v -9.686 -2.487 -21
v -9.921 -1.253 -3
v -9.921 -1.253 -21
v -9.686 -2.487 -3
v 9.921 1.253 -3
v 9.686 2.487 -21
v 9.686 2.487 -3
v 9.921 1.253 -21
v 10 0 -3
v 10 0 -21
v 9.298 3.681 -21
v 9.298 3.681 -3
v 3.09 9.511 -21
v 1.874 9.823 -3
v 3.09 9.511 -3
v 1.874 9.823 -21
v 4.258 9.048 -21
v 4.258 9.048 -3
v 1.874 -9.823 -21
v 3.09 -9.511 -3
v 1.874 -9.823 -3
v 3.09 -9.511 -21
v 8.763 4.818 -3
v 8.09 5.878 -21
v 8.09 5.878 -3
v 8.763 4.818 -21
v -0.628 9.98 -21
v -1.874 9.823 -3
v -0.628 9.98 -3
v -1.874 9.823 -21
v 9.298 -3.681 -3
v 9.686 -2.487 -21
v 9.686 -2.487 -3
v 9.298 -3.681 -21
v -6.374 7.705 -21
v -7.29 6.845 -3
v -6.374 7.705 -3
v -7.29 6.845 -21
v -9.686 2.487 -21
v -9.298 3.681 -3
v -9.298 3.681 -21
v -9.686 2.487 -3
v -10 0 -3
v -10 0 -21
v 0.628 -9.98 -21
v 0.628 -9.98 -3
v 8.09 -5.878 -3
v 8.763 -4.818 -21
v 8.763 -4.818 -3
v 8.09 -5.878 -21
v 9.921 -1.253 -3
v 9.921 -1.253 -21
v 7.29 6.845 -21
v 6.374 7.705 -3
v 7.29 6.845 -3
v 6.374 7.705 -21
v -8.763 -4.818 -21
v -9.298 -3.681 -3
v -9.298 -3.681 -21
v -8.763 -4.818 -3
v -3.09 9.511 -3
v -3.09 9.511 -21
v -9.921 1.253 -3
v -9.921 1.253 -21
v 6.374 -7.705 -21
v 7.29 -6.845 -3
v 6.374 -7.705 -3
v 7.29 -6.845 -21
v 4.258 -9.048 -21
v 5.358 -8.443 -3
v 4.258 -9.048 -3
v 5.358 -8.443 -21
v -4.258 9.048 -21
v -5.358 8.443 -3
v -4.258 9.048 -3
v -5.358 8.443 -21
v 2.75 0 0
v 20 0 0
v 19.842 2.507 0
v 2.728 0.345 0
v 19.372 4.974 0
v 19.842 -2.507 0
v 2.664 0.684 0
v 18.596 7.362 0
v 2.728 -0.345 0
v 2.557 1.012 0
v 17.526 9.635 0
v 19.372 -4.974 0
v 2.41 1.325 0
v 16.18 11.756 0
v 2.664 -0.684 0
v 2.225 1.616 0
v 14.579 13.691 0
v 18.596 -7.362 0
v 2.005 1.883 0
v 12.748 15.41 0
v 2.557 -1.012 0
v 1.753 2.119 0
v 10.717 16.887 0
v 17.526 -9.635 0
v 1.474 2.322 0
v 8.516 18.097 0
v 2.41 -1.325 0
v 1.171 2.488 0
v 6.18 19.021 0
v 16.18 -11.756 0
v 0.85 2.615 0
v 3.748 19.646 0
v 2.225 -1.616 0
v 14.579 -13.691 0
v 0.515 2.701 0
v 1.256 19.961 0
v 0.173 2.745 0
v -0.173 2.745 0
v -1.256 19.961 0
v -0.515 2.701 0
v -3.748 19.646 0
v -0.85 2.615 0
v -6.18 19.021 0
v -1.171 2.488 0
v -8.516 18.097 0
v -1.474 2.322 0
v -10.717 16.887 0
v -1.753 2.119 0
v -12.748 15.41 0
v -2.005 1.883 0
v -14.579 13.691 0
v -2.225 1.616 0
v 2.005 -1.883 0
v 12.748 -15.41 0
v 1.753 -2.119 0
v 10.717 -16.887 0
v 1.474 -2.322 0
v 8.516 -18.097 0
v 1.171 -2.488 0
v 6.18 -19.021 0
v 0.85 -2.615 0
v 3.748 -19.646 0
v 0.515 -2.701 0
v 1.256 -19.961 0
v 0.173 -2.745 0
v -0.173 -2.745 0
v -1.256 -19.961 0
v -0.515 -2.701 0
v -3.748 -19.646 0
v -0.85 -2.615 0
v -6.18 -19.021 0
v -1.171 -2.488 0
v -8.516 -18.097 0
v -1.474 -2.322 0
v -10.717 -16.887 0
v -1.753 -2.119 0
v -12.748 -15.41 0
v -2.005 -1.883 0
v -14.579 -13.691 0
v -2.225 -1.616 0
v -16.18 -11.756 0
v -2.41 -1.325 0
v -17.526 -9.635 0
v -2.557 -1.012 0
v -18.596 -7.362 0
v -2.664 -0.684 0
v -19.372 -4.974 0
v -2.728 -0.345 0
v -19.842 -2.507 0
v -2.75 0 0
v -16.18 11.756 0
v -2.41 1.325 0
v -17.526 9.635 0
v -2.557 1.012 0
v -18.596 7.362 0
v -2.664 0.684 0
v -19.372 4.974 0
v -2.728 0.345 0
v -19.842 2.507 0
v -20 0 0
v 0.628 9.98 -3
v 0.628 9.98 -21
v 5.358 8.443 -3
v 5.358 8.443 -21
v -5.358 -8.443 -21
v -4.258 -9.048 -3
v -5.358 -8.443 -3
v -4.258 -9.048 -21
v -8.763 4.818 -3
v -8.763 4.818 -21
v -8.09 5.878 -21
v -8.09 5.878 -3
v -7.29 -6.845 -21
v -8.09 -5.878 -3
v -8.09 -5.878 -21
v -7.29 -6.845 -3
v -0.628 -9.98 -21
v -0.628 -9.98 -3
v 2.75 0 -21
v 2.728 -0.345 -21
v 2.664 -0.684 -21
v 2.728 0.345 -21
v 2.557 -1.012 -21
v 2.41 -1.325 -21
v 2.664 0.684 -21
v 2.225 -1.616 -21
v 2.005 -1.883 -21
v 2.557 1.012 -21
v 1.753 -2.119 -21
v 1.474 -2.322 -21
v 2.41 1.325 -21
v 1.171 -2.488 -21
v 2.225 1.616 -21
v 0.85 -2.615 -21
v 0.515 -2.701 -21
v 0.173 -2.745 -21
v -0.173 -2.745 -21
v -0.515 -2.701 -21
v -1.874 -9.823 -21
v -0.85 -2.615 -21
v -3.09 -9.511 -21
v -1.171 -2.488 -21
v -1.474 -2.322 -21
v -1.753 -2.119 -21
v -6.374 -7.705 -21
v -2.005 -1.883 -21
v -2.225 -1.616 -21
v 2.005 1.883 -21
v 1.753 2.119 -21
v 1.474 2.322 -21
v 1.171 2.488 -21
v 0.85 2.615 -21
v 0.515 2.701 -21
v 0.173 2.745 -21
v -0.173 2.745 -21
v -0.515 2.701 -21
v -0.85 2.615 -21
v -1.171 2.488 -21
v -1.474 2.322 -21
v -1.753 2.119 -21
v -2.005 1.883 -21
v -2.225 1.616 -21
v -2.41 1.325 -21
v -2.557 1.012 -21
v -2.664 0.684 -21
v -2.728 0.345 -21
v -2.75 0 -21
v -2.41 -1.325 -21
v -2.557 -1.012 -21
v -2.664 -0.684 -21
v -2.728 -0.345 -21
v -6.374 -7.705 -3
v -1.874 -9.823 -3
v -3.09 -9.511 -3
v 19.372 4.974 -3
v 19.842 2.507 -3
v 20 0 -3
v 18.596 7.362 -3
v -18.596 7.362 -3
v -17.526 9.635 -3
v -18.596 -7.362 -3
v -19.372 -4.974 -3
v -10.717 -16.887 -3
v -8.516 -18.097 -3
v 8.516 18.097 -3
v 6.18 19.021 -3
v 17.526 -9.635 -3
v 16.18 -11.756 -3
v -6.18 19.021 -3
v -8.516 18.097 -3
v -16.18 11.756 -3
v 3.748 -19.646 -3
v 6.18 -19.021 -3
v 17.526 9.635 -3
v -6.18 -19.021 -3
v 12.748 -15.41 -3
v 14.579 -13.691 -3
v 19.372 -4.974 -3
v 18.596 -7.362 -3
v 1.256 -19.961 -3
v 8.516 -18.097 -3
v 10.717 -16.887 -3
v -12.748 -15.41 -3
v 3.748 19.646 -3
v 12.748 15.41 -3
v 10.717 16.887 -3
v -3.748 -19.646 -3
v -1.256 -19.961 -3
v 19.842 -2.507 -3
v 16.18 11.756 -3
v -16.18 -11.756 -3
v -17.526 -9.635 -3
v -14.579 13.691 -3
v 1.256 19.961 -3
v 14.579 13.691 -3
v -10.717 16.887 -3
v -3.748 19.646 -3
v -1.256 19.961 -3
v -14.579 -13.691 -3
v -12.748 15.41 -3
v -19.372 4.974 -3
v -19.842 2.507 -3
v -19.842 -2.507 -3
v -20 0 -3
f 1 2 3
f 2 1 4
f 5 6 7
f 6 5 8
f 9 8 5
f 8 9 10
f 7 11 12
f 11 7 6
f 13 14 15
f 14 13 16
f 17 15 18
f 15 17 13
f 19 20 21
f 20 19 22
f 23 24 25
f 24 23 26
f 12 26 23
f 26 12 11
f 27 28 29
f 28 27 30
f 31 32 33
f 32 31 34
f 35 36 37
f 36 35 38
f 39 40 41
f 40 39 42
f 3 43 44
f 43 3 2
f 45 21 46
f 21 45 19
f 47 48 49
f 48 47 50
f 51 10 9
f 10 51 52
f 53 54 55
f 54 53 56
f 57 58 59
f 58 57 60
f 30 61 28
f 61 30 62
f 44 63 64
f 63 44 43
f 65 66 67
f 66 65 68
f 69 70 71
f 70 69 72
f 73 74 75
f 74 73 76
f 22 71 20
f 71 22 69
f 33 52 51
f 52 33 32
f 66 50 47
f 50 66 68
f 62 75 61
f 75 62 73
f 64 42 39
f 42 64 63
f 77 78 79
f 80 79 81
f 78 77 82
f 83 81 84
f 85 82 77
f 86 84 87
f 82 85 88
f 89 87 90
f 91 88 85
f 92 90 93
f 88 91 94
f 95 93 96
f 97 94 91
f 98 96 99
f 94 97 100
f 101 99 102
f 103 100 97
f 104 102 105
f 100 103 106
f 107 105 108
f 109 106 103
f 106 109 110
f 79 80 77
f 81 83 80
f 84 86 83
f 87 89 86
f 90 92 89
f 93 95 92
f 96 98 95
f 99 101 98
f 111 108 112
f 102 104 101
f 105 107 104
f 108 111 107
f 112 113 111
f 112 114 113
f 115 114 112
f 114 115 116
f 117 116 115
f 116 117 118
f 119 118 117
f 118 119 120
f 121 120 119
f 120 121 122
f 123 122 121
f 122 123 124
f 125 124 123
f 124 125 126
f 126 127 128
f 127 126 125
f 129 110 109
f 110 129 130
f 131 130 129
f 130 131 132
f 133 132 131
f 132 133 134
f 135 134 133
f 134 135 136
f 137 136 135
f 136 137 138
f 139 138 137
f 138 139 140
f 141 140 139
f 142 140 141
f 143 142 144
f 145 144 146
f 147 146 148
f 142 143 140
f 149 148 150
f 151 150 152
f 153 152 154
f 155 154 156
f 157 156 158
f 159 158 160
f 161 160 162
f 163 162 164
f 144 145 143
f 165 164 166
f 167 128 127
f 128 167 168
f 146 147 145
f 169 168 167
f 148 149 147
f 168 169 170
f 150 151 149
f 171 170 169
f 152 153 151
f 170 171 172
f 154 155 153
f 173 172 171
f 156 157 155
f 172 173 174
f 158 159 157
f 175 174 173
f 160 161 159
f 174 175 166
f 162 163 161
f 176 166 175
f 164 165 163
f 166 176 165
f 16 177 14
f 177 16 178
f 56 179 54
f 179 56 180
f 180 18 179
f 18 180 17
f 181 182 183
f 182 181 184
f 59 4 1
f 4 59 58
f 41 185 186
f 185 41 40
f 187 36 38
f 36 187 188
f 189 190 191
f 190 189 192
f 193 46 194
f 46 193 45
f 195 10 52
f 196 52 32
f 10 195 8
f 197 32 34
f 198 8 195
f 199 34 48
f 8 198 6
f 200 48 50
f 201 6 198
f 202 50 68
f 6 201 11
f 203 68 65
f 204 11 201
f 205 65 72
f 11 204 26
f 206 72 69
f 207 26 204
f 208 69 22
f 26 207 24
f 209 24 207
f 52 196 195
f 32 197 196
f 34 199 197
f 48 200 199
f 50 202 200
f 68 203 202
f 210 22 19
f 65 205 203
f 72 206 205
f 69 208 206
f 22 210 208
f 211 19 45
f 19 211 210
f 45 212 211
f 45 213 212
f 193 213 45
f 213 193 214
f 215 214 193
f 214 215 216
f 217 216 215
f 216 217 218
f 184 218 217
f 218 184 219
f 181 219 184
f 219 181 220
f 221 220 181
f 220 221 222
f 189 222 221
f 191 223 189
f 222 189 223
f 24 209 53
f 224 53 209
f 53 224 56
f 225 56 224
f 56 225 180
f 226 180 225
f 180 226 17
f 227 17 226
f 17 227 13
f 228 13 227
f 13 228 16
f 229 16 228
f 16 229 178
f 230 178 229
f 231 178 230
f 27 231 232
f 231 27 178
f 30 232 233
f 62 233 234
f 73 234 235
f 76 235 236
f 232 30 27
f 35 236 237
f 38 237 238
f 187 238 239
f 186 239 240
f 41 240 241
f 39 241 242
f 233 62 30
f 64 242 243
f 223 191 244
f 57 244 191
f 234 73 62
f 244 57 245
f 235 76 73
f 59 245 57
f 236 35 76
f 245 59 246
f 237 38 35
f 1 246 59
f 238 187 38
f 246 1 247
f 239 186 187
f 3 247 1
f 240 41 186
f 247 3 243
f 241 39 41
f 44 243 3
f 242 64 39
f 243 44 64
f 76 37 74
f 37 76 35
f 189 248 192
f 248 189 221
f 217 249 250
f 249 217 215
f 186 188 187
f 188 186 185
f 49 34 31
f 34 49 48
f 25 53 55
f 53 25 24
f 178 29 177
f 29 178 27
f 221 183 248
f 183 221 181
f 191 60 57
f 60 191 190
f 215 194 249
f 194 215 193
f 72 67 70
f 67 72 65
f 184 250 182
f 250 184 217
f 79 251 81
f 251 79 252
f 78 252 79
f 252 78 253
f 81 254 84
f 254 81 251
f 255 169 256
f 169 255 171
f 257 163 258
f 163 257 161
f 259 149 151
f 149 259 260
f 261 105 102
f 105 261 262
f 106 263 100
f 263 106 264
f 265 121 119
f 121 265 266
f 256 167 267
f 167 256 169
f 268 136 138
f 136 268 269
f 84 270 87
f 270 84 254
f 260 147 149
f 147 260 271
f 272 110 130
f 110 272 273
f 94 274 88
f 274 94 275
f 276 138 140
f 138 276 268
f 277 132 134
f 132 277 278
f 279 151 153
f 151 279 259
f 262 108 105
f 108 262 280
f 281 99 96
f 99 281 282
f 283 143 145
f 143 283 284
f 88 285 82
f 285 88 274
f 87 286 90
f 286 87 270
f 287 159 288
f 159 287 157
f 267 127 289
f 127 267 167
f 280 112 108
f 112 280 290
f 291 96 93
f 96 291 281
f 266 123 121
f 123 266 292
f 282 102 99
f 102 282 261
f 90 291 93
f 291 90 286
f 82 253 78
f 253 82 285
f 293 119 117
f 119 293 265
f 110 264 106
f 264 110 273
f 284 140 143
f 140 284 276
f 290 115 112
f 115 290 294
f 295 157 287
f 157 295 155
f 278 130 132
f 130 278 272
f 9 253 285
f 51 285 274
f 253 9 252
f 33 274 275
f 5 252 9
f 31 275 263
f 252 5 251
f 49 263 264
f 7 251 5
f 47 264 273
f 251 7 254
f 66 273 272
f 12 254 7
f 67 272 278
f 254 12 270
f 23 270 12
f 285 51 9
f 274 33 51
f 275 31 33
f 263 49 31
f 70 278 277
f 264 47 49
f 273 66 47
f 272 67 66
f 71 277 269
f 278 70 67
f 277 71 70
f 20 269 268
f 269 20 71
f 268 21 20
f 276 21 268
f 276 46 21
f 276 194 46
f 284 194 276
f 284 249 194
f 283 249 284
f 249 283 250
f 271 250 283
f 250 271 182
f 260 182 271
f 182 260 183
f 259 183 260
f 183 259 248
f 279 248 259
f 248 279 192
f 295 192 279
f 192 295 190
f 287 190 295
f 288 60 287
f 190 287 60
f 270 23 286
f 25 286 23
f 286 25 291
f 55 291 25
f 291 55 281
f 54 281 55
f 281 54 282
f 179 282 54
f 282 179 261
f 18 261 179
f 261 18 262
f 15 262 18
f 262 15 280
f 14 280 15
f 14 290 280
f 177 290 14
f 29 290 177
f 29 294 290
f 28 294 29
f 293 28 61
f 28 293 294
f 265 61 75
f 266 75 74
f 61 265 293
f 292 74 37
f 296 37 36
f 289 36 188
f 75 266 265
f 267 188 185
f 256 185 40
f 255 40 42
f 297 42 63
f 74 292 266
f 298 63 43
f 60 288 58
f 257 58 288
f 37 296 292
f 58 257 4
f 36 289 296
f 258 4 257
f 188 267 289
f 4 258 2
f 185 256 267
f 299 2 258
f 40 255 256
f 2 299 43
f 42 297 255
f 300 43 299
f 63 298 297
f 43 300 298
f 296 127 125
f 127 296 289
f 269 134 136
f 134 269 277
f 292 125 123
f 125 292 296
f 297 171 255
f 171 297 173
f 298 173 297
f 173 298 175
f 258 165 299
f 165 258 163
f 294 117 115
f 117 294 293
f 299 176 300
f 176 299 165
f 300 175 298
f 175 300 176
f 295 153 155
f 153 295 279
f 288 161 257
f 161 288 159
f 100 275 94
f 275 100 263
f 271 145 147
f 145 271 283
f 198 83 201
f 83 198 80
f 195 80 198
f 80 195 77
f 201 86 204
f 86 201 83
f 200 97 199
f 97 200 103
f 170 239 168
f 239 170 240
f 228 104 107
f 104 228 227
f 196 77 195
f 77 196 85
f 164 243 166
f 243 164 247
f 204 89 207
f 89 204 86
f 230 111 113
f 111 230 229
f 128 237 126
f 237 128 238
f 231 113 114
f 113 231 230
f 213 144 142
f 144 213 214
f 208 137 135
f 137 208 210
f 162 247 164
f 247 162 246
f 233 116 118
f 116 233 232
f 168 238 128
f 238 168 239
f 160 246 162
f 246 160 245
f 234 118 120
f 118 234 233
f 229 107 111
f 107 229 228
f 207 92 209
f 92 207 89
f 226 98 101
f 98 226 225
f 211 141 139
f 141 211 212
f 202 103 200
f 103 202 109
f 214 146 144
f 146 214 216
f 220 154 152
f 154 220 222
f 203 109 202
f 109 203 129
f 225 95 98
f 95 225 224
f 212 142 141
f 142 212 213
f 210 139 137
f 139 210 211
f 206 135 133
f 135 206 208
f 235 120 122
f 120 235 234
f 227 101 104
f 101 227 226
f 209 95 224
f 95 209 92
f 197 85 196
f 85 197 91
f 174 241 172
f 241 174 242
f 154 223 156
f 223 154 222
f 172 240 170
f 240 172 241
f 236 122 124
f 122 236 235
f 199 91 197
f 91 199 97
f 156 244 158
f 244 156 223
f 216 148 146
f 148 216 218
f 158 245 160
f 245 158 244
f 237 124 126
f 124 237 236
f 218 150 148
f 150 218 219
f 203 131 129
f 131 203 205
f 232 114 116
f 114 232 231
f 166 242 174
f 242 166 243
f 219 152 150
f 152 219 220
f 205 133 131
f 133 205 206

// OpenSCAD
$fn = 50;


difference() {
	union() {
		translate(v = [0, 0, -21.0000000000]) {
			cylinder(h = 21, r = 10.0000000000);
		}
		translate(v = [0, 0, -3.0000000000]) {
			cylinder(h = 3, r = 20.0000000000);
		}
	}
	union() {
		#translate(v = [0, 0, -21]) {
			cylinder(h = 21, r = 2.7500000000);
		}
	}
}
